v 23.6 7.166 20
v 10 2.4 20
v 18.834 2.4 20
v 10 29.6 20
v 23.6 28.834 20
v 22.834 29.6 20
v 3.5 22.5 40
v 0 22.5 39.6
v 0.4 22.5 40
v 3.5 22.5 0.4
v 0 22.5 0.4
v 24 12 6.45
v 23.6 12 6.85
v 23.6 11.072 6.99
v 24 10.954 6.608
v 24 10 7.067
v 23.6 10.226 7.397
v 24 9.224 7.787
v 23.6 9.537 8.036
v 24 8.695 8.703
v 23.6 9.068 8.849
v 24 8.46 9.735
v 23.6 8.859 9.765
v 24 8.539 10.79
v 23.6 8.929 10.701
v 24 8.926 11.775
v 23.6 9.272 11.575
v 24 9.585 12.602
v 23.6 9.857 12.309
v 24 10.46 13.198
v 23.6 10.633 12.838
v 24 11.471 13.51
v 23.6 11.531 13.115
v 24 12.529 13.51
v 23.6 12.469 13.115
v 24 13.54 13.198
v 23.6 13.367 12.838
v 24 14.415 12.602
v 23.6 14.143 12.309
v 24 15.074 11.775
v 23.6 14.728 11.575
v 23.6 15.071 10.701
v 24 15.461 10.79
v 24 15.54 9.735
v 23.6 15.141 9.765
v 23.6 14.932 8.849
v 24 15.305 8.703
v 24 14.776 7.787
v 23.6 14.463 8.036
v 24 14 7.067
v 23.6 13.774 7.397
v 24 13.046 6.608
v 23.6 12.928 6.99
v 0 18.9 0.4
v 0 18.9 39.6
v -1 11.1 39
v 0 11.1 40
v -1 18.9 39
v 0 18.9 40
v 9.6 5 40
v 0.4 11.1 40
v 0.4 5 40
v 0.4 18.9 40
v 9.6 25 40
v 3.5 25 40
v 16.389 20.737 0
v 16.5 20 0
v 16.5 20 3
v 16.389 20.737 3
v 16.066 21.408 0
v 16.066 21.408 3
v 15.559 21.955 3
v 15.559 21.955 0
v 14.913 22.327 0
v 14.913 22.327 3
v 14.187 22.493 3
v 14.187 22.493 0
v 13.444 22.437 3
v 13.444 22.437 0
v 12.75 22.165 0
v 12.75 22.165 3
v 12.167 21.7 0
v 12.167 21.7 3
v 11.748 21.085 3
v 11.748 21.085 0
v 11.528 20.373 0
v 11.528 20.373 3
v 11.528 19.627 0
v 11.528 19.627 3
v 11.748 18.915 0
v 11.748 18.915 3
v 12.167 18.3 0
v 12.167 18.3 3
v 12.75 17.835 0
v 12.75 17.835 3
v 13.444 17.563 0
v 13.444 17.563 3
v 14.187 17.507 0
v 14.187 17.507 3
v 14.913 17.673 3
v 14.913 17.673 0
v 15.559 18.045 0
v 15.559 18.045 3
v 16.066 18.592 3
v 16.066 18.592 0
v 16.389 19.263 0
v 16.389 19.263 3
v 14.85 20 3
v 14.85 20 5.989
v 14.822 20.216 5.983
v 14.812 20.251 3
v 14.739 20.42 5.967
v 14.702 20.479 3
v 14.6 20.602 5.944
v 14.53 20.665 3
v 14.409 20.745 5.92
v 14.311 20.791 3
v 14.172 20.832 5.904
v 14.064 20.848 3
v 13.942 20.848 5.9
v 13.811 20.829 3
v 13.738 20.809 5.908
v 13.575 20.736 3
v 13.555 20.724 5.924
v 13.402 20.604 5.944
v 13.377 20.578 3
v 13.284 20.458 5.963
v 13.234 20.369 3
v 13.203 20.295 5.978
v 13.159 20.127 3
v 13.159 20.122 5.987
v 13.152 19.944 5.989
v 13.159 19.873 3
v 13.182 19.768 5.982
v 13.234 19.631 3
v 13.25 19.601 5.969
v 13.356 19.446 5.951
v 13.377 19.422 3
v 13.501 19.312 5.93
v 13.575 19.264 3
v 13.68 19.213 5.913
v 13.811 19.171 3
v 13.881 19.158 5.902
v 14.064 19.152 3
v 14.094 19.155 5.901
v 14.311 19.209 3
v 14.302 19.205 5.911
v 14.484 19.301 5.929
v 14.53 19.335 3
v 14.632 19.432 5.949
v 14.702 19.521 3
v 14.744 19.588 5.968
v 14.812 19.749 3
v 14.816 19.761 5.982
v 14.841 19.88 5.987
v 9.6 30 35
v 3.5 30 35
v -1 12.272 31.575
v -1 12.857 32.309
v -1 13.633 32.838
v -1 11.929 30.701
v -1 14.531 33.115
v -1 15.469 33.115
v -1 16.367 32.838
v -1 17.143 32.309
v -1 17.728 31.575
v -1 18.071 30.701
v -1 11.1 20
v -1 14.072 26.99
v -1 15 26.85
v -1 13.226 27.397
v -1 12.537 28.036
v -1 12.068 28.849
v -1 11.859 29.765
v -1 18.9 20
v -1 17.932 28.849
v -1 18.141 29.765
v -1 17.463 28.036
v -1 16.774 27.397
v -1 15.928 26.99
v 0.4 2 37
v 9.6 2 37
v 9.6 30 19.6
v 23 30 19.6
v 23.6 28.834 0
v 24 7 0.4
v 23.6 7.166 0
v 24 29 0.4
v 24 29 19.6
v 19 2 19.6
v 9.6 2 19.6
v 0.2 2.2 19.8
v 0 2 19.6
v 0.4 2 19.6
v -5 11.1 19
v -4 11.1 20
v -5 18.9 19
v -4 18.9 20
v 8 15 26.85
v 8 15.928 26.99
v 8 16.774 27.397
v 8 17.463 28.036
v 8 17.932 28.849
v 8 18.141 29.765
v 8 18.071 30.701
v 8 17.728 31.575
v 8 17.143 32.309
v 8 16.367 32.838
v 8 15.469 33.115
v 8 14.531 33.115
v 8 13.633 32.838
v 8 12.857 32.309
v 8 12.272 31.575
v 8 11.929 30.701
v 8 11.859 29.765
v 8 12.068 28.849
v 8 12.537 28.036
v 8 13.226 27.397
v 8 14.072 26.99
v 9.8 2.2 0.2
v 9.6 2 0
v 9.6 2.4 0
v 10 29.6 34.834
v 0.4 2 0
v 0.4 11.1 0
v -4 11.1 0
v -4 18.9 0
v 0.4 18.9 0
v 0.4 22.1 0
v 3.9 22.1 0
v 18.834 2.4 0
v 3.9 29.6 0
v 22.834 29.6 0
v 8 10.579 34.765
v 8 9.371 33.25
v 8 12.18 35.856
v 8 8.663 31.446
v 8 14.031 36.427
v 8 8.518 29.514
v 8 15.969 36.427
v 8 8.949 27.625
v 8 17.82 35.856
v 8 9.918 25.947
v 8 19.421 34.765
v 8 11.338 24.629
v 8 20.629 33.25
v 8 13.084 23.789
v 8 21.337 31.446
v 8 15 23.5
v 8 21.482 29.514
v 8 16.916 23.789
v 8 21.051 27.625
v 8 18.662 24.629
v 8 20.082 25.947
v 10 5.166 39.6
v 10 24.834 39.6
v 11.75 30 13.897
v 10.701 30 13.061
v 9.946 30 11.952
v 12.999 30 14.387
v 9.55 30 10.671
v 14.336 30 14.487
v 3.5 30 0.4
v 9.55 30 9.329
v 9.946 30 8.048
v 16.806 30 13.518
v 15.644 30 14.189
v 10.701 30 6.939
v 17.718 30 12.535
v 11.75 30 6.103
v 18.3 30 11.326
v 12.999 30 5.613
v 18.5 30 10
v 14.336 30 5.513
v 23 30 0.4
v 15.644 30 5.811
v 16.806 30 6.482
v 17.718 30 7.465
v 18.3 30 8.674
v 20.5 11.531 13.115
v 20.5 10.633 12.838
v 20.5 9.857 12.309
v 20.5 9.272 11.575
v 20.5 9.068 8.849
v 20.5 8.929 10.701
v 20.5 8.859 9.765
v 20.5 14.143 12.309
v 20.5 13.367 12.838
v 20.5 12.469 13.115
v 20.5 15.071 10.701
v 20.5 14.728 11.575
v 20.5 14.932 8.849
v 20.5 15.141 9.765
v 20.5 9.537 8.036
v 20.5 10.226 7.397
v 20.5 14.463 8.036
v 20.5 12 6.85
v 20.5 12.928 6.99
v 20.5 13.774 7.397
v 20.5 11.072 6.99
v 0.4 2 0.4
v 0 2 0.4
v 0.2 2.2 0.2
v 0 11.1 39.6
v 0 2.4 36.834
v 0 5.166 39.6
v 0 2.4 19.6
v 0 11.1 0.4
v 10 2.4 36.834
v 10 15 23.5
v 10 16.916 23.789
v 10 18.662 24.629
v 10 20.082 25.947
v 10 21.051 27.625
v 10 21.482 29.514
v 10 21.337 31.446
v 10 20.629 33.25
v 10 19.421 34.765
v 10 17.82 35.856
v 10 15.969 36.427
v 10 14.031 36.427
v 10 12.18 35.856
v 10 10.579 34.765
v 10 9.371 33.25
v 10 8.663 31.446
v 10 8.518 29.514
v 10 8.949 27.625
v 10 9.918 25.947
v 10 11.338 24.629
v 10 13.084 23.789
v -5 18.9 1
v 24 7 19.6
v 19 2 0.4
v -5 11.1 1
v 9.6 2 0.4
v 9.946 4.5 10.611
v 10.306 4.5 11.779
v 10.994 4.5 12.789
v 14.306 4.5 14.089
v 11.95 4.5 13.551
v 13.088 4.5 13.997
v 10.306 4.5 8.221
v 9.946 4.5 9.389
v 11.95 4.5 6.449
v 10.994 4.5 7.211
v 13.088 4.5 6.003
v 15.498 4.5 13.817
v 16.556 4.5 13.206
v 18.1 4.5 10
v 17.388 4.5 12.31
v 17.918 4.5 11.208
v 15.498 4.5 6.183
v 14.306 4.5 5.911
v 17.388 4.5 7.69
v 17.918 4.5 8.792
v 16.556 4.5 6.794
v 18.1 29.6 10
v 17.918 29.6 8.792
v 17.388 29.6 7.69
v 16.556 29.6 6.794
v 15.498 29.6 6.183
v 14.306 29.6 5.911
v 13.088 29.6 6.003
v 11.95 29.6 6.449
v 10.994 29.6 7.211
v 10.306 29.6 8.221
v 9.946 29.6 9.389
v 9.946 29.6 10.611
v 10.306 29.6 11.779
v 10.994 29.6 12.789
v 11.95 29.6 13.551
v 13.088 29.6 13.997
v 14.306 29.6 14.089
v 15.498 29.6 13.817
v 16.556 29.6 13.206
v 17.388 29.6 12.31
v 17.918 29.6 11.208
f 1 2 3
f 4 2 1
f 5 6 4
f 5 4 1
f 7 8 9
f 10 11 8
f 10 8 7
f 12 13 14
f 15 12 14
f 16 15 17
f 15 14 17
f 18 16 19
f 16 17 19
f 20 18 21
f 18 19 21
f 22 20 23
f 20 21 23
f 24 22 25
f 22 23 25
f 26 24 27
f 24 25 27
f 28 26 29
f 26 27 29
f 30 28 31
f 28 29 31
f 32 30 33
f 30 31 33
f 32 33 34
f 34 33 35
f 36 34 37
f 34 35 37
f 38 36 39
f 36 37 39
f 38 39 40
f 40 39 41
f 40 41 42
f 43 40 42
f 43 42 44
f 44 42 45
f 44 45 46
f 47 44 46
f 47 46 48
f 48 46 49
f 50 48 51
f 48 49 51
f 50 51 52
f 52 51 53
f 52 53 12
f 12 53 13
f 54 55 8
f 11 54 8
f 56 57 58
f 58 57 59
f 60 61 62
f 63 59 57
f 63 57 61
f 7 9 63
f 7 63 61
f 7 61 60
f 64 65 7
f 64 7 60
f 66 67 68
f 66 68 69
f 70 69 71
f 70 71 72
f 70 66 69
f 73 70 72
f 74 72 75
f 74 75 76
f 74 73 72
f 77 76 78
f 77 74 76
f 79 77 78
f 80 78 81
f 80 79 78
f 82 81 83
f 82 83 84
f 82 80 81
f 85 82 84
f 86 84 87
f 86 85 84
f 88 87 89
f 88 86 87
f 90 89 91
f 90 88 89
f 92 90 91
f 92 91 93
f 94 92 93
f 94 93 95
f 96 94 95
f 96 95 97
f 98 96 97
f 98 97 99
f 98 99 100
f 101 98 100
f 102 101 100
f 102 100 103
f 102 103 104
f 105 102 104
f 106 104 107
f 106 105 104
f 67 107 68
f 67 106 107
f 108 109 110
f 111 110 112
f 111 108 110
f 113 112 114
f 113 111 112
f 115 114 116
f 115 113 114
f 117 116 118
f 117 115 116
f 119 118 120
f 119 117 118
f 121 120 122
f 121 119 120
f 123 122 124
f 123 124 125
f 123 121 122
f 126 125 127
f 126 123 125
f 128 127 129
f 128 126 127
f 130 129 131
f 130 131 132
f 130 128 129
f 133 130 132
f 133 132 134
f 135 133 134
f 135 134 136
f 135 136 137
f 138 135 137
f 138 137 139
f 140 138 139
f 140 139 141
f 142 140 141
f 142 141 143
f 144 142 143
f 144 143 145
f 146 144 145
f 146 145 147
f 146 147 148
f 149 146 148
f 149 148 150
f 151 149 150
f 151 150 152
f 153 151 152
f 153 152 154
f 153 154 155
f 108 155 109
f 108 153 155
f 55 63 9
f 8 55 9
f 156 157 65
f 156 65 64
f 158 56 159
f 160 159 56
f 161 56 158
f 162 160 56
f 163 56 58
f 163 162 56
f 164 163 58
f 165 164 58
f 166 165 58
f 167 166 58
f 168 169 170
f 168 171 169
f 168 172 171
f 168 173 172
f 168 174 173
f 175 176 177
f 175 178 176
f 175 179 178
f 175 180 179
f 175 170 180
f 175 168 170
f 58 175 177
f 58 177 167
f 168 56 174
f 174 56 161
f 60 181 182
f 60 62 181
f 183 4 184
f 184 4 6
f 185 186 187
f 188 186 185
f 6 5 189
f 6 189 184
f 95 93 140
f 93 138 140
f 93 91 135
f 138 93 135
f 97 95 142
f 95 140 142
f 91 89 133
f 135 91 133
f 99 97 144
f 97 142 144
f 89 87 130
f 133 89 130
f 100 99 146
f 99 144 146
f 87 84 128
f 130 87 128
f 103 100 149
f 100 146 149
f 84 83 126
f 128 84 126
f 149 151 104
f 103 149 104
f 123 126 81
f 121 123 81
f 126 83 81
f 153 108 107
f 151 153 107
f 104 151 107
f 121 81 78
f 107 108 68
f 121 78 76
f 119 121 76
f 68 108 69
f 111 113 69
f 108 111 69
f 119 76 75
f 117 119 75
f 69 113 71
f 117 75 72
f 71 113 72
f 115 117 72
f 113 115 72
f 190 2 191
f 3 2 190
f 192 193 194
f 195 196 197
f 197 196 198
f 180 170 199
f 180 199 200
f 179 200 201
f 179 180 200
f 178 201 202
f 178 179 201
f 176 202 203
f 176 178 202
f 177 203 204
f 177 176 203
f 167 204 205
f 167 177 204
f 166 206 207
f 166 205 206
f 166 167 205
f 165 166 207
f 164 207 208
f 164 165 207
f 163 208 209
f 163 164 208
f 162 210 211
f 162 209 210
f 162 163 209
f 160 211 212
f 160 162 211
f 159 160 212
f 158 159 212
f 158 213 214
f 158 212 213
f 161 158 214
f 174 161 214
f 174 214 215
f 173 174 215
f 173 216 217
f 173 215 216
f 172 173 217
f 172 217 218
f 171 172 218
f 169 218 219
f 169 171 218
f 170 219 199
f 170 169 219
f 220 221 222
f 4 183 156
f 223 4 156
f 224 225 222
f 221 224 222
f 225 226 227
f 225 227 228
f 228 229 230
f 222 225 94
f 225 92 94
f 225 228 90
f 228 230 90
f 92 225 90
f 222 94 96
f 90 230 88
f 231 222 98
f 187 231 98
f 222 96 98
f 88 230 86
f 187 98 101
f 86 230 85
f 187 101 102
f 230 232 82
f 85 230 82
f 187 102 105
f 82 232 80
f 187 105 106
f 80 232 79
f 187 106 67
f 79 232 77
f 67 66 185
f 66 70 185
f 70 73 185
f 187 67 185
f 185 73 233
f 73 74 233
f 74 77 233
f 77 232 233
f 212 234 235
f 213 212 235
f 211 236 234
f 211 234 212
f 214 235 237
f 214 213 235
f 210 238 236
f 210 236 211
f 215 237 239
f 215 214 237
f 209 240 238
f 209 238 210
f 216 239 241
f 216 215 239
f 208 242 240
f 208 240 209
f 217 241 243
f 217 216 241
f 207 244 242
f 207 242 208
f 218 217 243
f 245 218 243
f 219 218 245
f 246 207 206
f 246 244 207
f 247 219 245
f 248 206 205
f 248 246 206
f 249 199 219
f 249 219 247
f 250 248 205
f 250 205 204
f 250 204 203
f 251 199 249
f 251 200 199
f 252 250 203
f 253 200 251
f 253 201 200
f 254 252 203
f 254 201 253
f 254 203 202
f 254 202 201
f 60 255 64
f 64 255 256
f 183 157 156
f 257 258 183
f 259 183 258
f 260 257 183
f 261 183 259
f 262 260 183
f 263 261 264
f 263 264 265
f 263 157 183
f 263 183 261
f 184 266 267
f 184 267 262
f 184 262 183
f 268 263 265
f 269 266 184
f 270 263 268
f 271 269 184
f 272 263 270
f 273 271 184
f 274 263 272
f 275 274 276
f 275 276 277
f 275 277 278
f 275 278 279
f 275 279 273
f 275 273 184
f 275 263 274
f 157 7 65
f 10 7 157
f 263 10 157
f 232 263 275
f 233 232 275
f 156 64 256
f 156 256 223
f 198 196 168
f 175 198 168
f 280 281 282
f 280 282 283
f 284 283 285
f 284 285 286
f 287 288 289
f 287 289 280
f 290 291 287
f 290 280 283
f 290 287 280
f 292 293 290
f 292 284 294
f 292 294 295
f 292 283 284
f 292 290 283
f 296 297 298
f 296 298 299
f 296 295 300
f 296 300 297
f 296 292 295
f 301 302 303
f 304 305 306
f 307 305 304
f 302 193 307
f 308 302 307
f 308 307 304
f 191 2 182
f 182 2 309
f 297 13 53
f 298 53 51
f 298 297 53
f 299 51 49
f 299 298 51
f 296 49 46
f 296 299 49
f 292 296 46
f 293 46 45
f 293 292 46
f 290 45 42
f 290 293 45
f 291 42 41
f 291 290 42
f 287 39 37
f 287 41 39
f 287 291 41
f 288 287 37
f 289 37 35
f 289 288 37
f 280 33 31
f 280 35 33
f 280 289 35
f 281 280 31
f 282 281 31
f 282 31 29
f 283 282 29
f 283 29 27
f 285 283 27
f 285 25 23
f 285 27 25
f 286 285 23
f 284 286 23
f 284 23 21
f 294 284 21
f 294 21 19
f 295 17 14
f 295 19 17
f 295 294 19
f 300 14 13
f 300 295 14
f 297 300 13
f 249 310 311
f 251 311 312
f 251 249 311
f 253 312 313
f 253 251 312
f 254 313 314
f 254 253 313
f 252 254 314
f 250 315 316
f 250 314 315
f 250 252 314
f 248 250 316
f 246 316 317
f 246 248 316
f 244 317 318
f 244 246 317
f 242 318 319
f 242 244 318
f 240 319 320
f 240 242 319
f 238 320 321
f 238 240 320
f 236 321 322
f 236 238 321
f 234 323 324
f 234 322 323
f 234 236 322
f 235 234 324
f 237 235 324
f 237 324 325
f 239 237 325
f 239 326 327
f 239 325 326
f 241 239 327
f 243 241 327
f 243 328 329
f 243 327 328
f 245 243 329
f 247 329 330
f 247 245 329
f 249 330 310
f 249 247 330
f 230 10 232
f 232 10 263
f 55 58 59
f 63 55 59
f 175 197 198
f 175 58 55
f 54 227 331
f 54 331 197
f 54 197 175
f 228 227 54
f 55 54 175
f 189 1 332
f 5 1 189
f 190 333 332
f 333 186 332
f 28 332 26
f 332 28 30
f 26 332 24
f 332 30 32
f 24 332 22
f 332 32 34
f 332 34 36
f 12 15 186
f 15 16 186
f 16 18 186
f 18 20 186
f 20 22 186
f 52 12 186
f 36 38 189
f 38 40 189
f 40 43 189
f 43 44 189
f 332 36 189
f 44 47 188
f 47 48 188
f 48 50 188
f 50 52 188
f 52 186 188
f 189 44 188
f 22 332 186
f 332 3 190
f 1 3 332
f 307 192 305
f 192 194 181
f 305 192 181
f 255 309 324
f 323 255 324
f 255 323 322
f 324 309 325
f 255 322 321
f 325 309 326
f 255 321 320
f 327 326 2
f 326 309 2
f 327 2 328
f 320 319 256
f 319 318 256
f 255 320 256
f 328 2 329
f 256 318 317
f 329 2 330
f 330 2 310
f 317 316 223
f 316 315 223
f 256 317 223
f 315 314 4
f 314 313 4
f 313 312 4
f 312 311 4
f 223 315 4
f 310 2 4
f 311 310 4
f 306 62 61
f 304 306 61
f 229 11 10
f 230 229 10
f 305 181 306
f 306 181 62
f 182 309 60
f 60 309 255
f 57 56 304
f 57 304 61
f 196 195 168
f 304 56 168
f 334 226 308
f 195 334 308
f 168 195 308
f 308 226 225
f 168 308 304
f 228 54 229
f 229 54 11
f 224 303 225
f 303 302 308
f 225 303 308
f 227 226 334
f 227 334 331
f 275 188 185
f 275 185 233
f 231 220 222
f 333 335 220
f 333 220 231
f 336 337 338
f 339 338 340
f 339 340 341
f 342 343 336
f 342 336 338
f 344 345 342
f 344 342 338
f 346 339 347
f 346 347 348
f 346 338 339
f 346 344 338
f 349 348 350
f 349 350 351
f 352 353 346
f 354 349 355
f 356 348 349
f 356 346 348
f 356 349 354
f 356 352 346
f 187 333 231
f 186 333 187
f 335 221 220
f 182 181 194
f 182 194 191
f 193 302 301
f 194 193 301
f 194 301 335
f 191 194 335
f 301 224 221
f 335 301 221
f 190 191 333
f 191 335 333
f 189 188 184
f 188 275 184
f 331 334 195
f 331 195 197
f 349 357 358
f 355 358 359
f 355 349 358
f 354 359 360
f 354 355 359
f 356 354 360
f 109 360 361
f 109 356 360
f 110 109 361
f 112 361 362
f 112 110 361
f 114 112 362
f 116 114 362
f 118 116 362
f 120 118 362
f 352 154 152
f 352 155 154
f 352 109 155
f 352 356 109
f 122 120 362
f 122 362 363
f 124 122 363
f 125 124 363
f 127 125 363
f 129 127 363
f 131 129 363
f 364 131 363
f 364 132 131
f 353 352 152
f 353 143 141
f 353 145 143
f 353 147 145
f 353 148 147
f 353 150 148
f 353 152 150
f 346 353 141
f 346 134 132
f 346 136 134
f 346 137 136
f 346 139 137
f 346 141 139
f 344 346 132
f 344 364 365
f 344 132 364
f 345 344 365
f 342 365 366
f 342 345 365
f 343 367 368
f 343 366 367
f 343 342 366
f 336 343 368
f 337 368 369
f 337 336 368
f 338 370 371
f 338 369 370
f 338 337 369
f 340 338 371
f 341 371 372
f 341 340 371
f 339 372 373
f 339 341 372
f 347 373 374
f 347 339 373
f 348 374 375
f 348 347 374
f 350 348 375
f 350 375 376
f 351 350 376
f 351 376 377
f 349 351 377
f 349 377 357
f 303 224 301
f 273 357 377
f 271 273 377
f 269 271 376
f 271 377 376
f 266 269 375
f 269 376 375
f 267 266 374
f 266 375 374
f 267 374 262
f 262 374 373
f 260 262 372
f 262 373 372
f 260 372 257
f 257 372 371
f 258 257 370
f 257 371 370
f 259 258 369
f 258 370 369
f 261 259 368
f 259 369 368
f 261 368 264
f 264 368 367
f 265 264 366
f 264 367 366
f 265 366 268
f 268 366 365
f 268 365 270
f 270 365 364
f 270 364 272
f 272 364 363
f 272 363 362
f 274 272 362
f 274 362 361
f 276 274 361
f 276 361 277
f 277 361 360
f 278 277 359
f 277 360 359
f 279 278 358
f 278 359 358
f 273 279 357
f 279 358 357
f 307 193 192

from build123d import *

# Parameters (mm, degrees)
CYLINDER016030_R            = 3.15
CYLINDER016030_DEPTH        = 10
CYLINDER_R                  = 4.1
CYLINDER_DEPTH              = 36
CYLINDER003_R               = 0.85
CYLINDER003_DEPTH           = 10
CYLINDER004_R               = 2.5
CYLINDER004_DEPTH           = 3
CYLINDER002_R               = 3.15
CYLINDER002_DEPTH           = 33
CYLINDER001_R               = 6.5
CYLINDER001_DEPTH           = 33
BOX013_W                    = 3.5
BOX013_H                    = 10
BOX013_DEPTH                = 43
BOX001_W                    = 10
BOX001_H                    = 28
BOX001_DEPTH                = 40
CHAMFER_SIZE                = 3
CHAMFER016009_SIZE          = 5
CHAMFER016013_SIZE          = 0.4
BOX003_W                    = 6
BOX003_H                    = 7.8
BOX003_DEPTH                = 20
BOX002_W                    = 2
BOX002_H                    = 7.8
BOX002_DEPTH                = 40
CHAMFER005_SIZE             = 1
BOX014_W                    = 3.5
BOX014_H                    = 10
BOX014_DEPTH                = 43
BOX_W                       = 24
BOX_H                       = 28
BOX_DEPTH                   = 20
CHAMFER016010_SIZE          = 5
CHAMFER016014_SIZE          = 1
CHAMFER016015_SIZE          = 0.4
CHAMFER016016_SIZE          = 0.4
CHAMFER016016008004017_SIZE = 0.4


with BuildPart() as cylinder044:
    # Cylinder016030 → Cylinder016030 (new body)
    with BuildSketch(Plane(origin=(20.5, 12, 10), x_dir=(0, 0, -1), z_dir=(1, 0, 0))):
        Circle(CYLINDER016030_R)
    extrude(amount=CYLINDER016030_DEPTH)


with BuildPart() as cylinder:
    # Cylinder → Cylinder (new body)
    with BuildSketch(Plane(origin=(14, 4.5, 10), x_dir=(1, 0, 0), z_dir=(0, 1, 0))):
        Circle(CYLINDER_R)
    extrude(amount=CYLINDER_DEPTH)


with BuildPart() as cylinder003:
    # Cylinder003 → Cylinder003 (new body)
    with BuildSketch(Plane(origin=(10, 20, 0), x_dir=(1, 0, 0), z_dir=(0, 0, 1))):
        Circle(CYLINDER003_R)
    extrude(amount=CYLINDER003_DEPTH)


with BuildPart() as fusion003:
    # Cylinder004 → Cylinder004 (new body)
    with BuildSketch(Plane(origin=(10, 20, 0), x_dir=(1, 0, 0), z_dir=(0, 0, 1))):
        Circle(CYLINDER004_R)
    extrude(amount=CYLINDER004_DEPTH)

    # Fusion003: union Cylinder003
    add(cylinder003.part)


with BuildPart() as fusion003_1:
    # Fusion003 placement: moved
    add(fusion003.part.moved(Location((4, 0, 0))))


with BuildPart() as cylinder002:
    # Cylinder002 → Cylinder002 (new body)
    with BuildSketch(Plane(origin=(-10, 15, 30), x_dir=(0, 0, -1), z_dir=(1, 0, 0))):
        Circle(CYLINDER002_R)
    extrude(amount=CYLINDER002_DEPTH)


with BuildPart() as fusion005:
    # Cylinder001 → Cylinder001 (new body)
    with BuildSketch(Plane(origin=(8, 15, 30), x_dir=(0, 0, -1), z_dir=(1, 0, 0))):
        Circle(CYLINDER001_R)
    extrude(amount=CYLINDER001_DEPTH)

    # Fusion005: union Cylinder002
    add(cylinder002.part)


with BuildPart() as cube013:
    # Box013 → Box013 (new body)
    with BuildSketch(Plane(origin=(0, 22.5, 0), x_dir=(1, 0, 0), z_dir=(0, 0, 1))):
        with Locations((1.75, 5)):
            Rectangle(BOX013_W, BOX013_H)
    extrude(amount=BOX013_DEPTH)


with BuildPart() as chamfer016013:
    # Box001 → Box001 (new body)
    with BuildSketch(Plane(origin=(0, 2, 0), x_dir=(1, 0, 0), z_dir=(0, 0, 1))):
        with Locations((5, 14)):
            Rectangle(BOX001_W, BOX001_H)
    extrude(amount=BOX001_DEPTH)

    # Chamfer
    chamfer_edges = [chamfer016013.edges().sort_by_distance(p)[0] for p in [
        (5, 2, 40),
    ]]
    chamfer(chamfer_edges, length=CHAMFER_SIZE)

    # Chamfer016009
    chamfer016009_edges = [chamfer016013.edges().sort_by_distance(p)[0] for p in [
        (5, 30, 40),
    ]]
    chamfer(chamfer016009_edges, length=CHAMFER016009_SIZE)

    # Cut010011002: cut Cube013
    add(cube013.part, mode=Mode.SUBTRACT)

    # Chamfer016013
    chamfer016013_edges = [chamfer016013.edges().sort_by_distance(p)[0] for p in [
        (0, 13.75, 40),
        (0, 12.25, 0),
        (0, 2, 18.5),
        (0, 3.5, 38.5),
        (10, 15, 40),
        (1.75, 22.5, 0),
        (3.5, 26.25, 0),
        (6.75, 30, 0),
        (10, 16, 0),
        (10, 2, 18.5),
        (10, 3.5, 38.5),
        (10, 27.5, 37.5),
        (10, 30, 17.5),
    ]]
    chamfer(chamfer016013_edges, length=CHAMFER016013_SIZE)


with BuildPart() as cube003:
    # Box003 → Box003 (new body)
    with BuildSketch(Plane(origin=(-5, 11.1, 0), x_dir=(1, 0, 0), z_dir=(0, 0, 1))):
        with Locations((3, 3.9)):
            Rectangle(BOX003_W, BOX003_H)
    extrude(amount=BOX003_DEPTH)


with BuildPart() as chamfer005:
    # Box002 → Box002 (new body)
    with BuildSketch(Plane(origin=(-1, 11.1, 0), x_dir=(1, 0, 0), z_dir=(0, 0, 1))):
        with Locations((1, 3.9)):
            Rectangle(BOX002_W, BOX002_H)
    extrude(amount=BOX002_DEPTH)

    # Fusion: union Cube003
    add(cube003.part)

    # Chamfer005
    chamfer005_edges = [chamfer005.edges().sort_by_distance(p)[0] for p in [
        (-5, 15, 0),
        (-1, 15, 40),
        (-5, 15, 20),
    ]]
    chamfer(chamfer005_edges, length=CHAMFER005_SIZE)


with BuildPart() as cube014:
    # Box014 → Box014 (new body)
    with BuildSketch(Plane(origin=(0, 22.5, 0), x_dir=(1, 0, 0), z_dir=(0, 0, 1))):
        with Locations((1.75, 5)):
            Rectangle(BOX014_W, BOX014_H)
    extrude(amount=BOX014_DEPTH)


with BuildPart() as rod_mount_front_w_magnet:
    # Box → Box (new body)
    with BuildSketch(Plane(origin=(0, 2, 0), x_dir=(1, 0, 0), z_dir=(0, 0, 1))):
        with Locations((12, 14)):
            Rectangle(BOX_W, BOX_H)
    extrude(amount=BOX_DEPTH)

    # Chamfer016010
    chamfer016010_edges = [rod_mount_front_w_magnet.edges().sort_by_distance(p)[0] for p in [
        (24, 2, 10),
    ]]
    chamfer(chamfer016010_edges, length=CHAMFER016010_SIZE)

    # Chamfer016014
    chamfer016014_edges = [rod_mount_front_w_magnet.edges().sort_by_distance(p)[0] for p in [
        (24, 30, 10),
    ]]
    chamfer(chamfer016014_edges, length=CHAMFER016014_SIZE)

    # Cut: cut Cube014
    add(cube014.part, mode=Mode.SUBTRACT)

    # Chamfer016015
    chamfer016015_edges = [rod_mount_front_w_magnet.edges().sort_by_distance(p)[0] for p in [
        (24, 18, 20),
        (24, 18, 0),
        (21.5, 4.5, 20),
        (9.5, 2, 20),
        (0, 12.25, 20),
        (1.75, 22.5, 20),
        (3.5, 26.25, 20),
        (13.25, 30, 20),
        (23.5, 29.5, 20),
        (23.5, 29.5, 0),
        (21.5, 4.5, 0),
        (9.5, 2, 0),
        (0, 12.25, 0),
        (1.75, 22.5, 0),
        (3.5, 26.25, 0),
        (13.25, 30, 0),
    ]]
    chamfer(chamfer016015_edges, length=CHAMFER016015_SIZE)

    # Fusion016: union Chamfer016013, Chamfer005
    add(chamfer016013.part)
    add(chamfer005.part)

    # Cut010011003: cut Fusion005
    add(fusion005.part, mode=Mode.SUBTRACT)

    # Cut010011004: cut Fusion003
    add(fusion003_1.part, mode=Mode.SUBTRACT)

    # Cut010011005: cut Cylinder
    add(cylinder.part, mode=Mode.SUBTRACT)

    # Chamfer016016
    chamfer016016_edges = [rod_mount_front_w_magnet.edges().sort_by_distance(p)[0] for p in [
        (9.9, 30, 10),
    ]]
    chamfer(chamfer016016_edges, length=CHAMFER016016_SIZE)

    # Cut010011008009003016002: cut Cylinder044
    add(cylinder044.part, mode=Mode.SUBTRACT)

    # Chamfer016016008004017
    chamfer016016008004017_edges = [rod_mount_front_w_magnet.edges().sort_by_distance(p)[0] for p in [
        (24, 12, 13.15),
    ]]
    chamfer(chamfer016016008004017_edges, length=CHAMFER016016008004017_SIZE)


solid = rod_mount_front_w_magnet.part
